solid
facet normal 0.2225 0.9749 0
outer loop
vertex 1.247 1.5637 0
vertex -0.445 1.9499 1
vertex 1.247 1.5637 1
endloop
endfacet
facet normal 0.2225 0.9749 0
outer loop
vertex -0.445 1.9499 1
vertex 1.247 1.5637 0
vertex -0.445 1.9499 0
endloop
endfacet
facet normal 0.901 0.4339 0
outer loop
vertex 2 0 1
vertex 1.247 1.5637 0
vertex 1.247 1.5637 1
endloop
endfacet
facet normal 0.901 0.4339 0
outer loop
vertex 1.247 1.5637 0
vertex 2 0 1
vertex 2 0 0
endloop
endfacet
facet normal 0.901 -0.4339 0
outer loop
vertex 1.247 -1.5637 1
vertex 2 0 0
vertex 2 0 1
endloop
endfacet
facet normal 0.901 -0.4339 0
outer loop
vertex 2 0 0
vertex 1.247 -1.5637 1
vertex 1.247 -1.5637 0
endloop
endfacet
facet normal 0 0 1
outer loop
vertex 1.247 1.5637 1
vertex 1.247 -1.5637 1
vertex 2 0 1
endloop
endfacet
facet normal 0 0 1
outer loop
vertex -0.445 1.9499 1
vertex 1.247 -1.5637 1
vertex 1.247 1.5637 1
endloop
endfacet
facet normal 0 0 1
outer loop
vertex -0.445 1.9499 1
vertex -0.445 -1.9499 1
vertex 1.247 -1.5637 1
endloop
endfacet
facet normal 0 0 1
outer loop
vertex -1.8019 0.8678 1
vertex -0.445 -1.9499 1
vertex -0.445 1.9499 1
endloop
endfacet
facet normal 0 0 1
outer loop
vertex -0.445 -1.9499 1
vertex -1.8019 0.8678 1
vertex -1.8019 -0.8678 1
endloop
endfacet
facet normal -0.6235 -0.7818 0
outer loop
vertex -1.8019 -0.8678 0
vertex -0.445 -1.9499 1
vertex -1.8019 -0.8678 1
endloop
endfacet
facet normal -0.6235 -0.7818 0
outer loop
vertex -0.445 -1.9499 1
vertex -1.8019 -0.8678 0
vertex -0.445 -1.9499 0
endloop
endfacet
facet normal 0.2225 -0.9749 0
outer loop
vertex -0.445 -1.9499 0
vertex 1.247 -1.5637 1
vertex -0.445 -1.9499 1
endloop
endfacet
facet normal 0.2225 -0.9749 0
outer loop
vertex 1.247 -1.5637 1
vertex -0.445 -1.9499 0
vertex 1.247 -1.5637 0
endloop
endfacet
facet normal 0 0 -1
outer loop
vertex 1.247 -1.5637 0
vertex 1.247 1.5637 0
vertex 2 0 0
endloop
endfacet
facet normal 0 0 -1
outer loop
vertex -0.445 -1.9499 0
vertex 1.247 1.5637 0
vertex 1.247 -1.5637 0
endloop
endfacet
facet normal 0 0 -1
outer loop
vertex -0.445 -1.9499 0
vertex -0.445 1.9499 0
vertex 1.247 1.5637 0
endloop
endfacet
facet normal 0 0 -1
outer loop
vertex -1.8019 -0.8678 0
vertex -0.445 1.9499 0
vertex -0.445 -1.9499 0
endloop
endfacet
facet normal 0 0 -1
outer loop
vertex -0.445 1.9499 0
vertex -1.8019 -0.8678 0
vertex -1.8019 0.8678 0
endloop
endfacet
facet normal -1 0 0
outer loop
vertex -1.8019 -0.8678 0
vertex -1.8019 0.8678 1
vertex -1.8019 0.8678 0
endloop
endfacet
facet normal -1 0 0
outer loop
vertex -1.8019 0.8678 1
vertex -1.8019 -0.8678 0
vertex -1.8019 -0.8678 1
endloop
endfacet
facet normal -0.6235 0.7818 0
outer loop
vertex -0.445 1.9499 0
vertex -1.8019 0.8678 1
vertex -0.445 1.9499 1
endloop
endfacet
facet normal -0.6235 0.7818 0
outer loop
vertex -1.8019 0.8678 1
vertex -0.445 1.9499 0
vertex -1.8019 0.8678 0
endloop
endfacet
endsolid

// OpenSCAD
cylinder(r = -1, h = 2);
cylinder(h = -2);
cylinder(r = 1, d = 4, h = 1);
cylinder(r1 = 1, d1 = 4, h = 1);
cylinder(h = 1, r = 1, r1 = 2);
